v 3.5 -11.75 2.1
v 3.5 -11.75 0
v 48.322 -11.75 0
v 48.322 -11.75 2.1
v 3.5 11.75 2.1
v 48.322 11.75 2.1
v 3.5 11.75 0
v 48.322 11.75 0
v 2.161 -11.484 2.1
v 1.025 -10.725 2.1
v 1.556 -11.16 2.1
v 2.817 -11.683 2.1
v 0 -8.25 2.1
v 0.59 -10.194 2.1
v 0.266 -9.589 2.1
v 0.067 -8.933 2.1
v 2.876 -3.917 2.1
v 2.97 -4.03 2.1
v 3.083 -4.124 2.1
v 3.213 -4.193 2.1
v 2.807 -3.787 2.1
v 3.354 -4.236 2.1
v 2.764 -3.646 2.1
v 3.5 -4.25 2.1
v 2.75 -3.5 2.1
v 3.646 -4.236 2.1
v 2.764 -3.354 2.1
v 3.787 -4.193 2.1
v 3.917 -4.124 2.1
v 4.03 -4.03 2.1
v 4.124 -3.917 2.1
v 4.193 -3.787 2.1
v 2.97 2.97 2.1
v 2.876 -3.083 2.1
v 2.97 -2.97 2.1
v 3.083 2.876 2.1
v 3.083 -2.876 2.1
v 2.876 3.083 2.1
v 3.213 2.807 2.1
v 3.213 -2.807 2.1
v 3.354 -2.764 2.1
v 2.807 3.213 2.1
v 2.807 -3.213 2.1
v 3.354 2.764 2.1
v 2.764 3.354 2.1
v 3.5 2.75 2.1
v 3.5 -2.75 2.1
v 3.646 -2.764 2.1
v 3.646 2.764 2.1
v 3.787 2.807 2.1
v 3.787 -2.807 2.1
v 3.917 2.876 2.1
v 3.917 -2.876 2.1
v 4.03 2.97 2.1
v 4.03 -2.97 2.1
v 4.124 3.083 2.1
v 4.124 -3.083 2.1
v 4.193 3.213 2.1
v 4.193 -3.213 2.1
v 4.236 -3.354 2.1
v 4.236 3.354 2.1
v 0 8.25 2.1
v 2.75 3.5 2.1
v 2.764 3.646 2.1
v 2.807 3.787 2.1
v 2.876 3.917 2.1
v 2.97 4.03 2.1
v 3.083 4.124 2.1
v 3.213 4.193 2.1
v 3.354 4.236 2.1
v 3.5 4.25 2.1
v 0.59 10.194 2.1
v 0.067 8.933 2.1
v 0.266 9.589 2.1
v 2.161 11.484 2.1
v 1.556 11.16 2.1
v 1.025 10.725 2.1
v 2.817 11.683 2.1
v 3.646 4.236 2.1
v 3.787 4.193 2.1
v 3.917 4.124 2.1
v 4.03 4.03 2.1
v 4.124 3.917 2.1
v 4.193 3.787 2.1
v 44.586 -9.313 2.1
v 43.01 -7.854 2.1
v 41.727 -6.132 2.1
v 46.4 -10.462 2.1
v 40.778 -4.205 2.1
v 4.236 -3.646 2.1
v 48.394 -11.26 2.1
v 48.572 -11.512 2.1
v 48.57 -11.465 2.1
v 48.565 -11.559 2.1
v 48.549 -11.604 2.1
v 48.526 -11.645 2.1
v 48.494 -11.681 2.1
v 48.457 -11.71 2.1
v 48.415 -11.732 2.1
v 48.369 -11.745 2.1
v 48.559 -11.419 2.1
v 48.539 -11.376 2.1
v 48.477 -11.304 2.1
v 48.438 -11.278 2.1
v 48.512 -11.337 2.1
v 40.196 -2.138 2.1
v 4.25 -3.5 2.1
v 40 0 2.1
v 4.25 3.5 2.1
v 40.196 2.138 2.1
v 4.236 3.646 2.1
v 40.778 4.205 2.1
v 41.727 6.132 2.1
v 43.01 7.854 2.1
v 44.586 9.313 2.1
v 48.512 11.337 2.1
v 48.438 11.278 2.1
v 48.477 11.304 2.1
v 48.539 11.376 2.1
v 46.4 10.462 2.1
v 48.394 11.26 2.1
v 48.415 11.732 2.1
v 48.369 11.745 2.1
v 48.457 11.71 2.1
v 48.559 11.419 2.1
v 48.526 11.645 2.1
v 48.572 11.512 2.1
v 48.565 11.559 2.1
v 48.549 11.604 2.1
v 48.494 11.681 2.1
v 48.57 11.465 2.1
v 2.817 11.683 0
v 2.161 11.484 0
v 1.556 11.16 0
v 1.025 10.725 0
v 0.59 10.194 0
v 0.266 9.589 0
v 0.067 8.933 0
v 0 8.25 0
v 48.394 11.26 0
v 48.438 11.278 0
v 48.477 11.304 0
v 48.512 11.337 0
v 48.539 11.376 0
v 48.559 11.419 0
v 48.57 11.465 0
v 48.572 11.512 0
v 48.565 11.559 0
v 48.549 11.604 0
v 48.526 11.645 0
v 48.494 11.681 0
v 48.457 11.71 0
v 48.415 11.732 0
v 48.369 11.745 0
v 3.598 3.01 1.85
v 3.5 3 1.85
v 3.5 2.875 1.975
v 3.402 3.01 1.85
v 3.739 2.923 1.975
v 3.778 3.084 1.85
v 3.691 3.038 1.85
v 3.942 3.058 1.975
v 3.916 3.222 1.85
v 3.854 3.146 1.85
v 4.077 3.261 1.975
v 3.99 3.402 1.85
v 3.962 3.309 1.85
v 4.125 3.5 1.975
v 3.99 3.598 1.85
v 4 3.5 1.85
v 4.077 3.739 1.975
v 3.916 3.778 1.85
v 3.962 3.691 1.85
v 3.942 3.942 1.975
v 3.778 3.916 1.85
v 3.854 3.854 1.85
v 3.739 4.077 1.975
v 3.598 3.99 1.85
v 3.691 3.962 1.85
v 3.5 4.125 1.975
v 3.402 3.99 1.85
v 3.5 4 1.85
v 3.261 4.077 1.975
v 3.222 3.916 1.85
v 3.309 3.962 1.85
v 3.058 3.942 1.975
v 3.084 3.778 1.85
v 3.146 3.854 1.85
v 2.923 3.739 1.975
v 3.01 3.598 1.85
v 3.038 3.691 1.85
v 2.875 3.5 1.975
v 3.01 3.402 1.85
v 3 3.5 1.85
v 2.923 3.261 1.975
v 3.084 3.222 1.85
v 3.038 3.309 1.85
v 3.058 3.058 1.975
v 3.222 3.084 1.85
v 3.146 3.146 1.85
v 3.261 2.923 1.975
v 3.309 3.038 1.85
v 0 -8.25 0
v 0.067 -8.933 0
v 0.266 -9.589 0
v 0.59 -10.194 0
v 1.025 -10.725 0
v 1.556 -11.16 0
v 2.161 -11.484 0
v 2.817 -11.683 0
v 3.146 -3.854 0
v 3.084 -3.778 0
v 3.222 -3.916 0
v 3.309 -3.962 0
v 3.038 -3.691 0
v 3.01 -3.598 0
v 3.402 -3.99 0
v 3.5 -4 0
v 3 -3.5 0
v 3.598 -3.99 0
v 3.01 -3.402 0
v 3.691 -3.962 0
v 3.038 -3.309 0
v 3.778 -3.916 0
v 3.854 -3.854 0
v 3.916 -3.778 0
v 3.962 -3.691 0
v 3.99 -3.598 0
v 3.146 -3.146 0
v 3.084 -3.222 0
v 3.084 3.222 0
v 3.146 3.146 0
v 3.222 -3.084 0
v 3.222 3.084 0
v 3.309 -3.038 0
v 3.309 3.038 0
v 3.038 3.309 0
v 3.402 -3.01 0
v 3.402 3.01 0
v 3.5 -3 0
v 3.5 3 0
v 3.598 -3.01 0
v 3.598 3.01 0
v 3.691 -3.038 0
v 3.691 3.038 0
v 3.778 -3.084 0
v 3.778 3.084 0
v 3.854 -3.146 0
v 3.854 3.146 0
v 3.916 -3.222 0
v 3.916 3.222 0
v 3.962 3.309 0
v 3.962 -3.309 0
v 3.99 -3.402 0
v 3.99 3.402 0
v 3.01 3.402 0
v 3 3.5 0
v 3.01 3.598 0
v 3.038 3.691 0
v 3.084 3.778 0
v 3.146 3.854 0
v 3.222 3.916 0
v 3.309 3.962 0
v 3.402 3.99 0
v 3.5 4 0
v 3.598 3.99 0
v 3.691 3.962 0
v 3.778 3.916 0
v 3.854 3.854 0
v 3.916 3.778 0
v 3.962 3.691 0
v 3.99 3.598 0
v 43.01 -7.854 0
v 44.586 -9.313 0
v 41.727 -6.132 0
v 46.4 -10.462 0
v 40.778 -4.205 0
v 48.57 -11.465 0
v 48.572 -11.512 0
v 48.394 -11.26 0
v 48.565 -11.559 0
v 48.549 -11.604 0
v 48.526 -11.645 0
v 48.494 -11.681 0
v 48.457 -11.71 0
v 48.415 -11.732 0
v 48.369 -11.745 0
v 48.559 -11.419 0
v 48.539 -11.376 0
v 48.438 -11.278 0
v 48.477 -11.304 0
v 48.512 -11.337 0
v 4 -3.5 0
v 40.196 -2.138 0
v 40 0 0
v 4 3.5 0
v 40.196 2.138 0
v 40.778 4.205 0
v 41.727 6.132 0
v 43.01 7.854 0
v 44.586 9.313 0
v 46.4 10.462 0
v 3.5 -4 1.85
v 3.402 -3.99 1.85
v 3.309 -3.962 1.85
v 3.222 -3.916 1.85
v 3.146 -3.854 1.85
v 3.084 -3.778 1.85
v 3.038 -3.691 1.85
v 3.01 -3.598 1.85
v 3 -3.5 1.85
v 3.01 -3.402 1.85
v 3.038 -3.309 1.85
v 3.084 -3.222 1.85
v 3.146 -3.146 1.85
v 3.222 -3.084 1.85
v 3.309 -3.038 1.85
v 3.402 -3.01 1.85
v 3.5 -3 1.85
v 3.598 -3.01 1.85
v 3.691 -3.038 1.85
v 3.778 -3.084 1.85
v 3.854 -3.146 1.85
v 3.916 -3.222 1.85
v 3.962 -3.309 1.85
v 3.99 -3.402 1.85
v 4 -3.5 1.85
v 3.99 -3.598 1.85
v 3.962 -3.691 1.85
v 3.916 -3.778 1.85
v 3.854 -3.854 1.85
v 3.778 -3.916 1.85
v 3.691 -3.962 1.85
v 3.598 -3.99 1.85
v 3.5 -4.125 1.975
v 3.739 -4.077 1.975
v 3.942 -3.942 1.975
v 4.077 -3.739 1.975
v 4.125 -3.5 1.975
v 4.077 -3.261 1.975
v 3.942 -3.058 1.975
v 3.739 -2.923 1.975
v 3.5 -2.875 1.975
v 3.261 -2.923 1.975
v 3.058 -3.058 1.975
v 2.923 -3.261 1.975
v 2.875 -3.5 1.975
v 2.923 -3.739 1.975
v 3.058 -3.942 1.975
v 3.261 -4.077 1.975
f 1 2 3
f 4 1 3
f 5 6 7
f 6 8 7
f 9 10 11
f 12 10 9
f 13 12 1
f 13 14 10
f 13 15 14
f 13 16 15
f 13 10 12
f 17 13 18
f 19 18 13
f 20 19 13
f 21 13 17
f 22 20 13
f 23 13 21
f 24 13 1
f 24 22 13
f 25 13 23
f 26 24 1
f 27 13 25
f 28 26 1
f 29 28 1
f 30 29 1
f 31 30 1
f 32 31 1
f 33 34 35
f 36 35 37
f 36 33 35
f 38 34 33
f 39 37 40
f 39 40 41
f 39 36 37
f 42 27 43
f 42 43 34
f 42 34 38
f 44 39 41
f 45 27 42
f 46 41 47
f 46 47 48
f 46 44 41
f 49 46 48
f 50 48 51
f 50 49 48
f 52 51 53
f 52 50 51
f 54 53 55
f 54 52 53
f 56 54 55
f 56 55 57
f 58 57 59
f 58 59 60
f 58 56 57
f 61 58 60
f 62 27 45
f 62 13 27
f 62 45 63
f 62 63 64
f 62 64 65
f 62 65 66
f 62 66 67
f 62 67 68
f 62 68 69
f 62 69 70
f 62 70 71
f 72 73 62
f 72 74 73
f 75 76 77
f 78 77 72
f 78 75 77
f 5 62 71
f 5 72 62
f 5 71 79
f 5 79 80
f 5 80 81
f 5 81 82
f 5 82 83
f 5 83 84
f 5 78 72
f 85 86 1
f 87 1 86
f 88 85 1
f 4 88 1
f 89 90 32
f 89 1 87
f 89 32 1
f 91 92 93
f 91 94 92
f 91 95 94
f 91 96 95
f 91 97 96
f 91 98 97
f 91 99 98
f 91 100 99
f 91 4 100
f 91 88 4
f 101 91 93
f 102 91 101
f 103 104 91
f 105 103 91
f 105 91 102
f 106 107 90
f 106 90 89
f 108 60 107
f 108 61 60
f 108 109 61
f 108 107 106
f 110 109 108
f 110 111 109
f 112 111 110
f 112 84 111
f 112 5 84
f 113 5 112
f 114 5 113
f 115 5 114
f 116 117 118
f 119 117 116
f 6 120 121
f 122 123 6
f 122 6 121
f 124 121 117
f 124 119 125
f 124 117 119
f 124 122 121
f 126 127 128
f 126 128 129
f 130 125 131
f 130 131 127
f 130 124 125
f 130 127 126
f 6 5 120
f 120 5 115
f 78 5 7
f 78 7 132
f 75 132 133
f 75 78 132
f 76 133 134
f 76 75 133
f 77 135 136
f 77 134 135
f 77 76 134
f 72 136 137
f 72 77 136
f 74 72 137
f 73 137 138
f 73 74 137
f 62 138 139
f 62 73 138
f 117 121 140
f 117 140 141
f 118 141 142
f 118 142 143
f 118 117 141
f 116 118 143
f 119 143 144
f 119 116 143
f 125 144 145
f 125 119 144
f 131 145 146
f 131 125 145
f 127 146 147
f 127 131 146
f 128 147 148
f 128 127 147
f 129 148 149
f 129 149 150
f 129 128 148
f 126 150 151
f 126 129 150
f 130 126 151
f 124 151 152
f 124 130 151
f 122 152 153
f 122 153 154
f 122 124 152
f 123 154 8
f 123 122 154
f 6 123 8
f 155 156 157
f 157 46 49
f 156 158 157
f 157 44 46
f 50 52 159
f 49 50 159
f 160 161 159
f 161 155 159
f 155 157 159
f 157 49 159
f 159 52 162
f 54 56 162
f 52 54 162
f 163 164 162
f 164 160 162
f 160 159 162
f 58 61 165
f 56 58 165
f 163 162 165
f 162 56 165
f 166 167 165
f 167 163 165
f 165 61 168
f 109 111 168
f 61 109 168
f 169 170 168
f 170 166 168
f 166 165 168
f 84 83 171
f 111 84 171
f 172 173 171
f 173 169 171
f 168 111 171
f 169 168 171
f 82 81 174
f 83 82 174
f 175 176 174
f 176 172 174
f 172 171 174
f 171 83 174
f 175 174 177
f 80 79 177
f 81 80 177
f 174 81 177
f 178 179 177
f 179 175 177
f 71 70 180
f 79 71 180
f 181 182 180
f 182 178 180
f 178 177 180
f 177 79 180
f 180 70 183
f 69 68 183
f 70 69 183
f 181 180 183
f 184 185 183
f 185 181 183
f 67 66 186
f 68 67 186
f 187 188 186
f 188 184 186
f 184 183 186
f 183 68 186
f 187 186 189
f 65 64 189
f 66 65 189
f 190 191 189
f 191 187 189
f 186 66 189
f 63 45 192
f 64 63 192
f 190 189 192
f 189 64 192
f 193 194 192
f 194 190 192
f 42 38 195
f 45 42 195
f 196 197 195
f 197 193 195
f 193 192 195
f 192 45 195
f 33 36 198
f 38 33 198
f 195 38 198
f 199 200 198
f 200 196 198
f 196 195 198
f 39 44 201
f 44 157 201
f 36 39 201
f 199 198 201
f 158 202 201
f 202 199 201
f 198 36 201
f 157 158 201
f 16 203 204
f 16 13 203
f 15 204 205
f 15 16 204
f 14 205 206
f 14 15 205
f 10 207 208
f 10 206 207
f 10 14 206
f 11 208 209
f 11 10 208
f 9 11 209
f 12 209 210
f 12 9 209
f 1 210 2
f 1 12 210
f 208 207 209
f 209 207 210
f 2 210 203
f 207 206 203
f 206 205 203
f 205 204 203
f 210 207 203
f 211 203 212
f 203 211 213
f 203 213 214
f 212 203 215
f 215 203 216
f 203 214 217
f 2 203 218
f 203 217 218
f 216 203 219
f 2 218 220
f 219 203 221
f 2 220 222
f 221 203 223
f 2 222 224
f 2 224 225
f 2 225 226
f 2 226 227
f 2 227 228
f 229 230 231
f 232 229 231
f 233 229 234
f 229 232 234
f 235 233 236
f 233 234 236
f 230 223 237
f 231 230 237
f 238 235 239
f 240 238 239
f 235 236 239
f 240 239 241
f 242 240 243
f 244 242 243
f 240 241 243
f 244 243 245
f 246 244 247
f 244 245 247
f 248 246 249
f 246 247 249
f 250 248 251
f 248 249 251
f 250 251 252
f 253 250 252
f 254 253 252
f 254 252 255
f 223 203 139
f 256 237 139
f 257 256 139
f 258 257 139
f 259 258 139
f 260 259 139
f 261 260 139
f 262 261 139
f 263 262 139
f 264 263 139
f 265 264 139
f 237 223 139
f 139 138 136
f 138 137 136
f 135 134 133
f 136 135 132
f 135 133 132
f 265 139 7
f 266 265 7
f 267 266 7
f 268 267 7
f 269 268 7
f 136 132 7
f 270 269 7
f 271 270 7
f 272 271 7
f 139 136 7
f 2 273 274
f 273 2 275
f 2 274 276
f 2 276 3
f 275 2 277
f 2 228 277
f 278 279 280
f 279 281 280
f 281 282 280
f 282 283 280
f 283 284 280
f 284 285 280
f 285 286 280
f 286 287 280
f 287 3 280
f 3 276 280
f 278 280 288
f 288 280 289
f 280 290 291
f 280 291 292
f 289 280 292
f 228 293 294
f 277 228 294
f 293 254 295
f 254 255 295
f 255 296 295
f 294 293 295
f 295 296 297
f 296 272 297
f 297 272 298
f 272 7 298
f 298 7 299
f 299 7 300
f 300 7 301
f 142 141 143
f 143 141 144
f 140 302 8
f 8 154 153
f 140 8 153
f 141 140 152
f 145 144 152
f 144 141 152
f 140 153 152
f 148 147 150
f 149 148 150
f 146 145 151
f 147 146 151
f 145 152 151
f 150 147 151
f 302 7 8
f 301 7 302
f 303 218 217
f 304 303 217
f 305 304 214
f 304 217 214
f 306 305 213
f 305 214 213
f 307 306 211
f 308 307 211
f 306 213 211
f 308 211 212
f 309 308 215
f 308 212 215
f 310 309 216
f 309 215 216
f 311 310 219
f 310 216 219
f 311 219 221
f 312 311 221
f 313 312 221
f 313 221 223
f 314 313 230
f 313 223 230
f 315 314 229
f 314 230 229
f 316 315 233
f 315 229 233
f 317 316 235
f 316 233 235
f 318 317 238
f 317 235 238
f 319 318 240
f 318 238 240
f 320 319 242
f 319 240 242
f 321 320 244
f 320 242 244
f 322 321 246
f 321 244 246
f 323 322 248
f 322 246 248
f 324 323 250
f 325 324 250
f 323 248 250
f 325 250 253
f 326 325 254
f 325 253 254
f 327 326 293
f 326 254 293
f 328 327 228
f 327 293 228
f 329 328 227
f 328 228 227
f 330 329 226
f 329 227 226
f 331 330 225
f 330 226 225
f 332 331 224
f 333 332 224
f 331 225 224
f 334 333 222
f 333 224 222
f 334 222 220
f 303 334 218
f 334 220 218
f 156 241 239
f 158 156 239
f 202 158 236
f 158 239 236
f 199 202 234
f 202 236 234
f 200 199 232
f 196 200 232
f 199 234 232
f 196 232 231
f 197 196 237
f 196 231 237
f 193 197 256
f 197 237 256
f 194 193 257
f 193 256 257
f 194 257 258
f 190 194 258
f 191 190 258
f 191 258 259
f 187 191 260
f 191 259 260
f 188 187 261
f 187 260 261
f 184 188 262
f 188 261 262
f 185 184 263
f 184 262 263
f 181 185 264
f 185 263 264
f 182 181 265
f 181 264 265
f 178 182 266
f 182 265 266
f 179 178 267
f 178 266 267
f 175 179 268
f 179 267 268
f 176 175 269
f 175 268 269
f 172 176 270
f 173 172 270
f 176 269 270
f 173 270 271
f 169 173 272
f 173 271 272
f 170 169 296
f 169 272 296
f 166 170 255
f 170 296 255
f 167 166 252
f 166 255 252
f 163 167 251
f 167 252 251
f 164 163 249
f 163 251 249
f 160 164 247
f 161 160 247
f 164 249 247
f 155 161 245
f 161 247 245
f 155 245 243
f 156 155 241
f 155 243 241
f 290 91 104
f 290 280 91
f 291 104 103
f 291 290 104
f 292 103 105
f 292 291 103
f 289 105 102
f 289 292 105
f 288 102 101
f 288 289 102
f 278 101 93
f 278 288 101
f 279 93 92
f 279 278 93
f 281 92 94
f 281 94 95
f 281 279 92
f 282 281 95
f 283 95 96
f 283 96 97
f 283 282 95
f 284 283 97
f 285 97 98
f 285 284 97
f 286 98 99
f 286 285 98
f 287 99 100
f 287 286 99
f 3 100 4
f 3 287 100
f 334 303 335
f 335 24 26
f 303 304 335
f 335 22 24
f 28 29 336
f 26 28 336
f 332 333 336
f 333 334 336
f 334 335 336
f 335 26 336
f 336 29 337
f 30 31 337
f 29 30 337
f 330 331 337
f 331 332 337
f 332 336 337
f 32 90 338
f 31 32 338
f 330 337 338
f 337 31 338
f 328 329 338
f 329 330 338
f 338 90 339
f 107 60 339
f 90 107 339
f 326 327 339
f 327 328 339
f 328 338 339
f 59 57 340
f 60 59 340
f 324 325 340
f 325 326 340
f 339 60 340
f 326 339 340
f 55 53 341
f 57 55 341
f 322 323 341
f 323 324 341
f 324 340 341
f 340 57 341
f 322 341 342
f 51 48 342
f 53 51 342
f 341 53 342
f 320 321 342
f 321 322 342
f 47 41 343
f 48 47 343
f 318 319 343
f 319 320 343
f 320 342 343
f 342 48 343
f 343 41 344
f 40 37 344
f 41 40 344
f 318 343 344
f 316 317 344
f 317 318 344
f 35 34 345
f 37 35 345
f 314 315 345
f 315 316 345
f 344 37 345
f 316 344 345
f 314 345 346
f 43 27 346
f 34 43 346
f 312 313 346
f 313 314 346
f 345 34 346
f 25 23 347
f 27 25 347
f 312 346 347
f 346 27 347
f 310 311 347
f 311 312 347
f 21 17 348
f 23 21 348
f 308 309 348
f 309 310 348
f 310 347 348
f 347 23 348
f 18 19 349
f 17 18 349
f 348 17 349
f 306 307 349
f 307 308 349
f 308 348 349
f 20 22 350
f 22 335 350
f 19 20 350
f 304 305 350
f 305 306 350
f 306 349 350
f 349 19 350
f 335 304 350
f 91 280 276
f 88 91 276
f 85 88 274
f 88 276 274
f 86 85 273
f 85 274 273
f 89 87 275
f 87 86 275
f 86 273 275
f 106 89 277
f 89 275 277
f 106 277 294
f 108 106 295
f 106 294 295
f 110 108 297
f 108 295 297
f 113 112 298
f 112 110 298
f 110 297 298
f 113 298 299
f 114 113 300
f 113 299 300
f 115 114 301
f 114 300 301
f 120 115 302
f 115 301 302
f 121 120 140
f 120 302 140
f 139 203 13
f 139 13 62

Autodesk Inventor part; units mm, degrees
ref_plane "YZ Plane" through (0, 0, 0) normal (1, 0, 0) x (0, 1, 0)
ref_plane "XZ Plane" through (0, 0, 0) normal (0, 1, 0) x (-1, 0, 0)
ref_plane "XY Plane" through (0, 0, 0) normal (0, 0, 1) x (1, 0, 0)
sketch "Эскиз1" plane through (0, 0, 0) normal (0, 0, 1) x (1, 0, 0)
  line L0 (51.75, 11.75) -> (0, 11.75)
  line L1 (0, -11.75) -> (51.75, -11.75)
  arc A0 (51.75, 11.75) -> (51.75, -11.75) centre (51.75, 0) ccw
  line L2 (0, -11.75) -> (0, 11.75)
  line L3 (0, 0) -> (40, 0) construction
  line L4 (0, 0) -> (0, 11.75) construction
  line L5 (0, 11.75) -> (0, 11.25)
  point P0 (20, 0)
  dimension "d0" = 11.75
  dimension "d47" = 40
extrude "Выдавливание3" add sketch "Эскиз1" along normal blind 2.1
fillet "Сопряжение3" radius 0.25 2 edges at (51.75, 11.75, 1.05) (51.75, -11.75, 1.05)
fillet "Сопряжение4" radius 3.5 2 edges at (0, -11.75, 1.05) (0, 11.75, 1.05)
sketch "Эскиз6" plane through (0, 0, 2.1) normal (0, 0, 1) x (1, 0, 0)
  arc A0 (48.3936, 11.2604) -> (48.3936, -11.2604) centre (51.75, 0) ccw construction
  line L0 (40, 0) -> (0, 0) construction
  line L1 (0, -11.75) -> (0, 11.75) construction
  circle A1 centre (3.5, 3.5) radius 0.5
  line L2 (3.5, 3.5) -> (0, 3.5) construction
  line L3 (3.5, 3.5) -> (3.5, 0) construction
  circle A2 centre (3.5, -3.5) radius 0.5
  point P0 (48.3222, -11.75)
  dimension "d58" = 1
  dimension "d59" = 3.5
hole "Отверстие1" at (3.5, -3.5, 2.1) at (3.5, 3.5, 2.1) direction (0, 0, -1) diameter 1 end through all countersink diameter 1.5 countersink angle 90
properties part number "Поршень"
